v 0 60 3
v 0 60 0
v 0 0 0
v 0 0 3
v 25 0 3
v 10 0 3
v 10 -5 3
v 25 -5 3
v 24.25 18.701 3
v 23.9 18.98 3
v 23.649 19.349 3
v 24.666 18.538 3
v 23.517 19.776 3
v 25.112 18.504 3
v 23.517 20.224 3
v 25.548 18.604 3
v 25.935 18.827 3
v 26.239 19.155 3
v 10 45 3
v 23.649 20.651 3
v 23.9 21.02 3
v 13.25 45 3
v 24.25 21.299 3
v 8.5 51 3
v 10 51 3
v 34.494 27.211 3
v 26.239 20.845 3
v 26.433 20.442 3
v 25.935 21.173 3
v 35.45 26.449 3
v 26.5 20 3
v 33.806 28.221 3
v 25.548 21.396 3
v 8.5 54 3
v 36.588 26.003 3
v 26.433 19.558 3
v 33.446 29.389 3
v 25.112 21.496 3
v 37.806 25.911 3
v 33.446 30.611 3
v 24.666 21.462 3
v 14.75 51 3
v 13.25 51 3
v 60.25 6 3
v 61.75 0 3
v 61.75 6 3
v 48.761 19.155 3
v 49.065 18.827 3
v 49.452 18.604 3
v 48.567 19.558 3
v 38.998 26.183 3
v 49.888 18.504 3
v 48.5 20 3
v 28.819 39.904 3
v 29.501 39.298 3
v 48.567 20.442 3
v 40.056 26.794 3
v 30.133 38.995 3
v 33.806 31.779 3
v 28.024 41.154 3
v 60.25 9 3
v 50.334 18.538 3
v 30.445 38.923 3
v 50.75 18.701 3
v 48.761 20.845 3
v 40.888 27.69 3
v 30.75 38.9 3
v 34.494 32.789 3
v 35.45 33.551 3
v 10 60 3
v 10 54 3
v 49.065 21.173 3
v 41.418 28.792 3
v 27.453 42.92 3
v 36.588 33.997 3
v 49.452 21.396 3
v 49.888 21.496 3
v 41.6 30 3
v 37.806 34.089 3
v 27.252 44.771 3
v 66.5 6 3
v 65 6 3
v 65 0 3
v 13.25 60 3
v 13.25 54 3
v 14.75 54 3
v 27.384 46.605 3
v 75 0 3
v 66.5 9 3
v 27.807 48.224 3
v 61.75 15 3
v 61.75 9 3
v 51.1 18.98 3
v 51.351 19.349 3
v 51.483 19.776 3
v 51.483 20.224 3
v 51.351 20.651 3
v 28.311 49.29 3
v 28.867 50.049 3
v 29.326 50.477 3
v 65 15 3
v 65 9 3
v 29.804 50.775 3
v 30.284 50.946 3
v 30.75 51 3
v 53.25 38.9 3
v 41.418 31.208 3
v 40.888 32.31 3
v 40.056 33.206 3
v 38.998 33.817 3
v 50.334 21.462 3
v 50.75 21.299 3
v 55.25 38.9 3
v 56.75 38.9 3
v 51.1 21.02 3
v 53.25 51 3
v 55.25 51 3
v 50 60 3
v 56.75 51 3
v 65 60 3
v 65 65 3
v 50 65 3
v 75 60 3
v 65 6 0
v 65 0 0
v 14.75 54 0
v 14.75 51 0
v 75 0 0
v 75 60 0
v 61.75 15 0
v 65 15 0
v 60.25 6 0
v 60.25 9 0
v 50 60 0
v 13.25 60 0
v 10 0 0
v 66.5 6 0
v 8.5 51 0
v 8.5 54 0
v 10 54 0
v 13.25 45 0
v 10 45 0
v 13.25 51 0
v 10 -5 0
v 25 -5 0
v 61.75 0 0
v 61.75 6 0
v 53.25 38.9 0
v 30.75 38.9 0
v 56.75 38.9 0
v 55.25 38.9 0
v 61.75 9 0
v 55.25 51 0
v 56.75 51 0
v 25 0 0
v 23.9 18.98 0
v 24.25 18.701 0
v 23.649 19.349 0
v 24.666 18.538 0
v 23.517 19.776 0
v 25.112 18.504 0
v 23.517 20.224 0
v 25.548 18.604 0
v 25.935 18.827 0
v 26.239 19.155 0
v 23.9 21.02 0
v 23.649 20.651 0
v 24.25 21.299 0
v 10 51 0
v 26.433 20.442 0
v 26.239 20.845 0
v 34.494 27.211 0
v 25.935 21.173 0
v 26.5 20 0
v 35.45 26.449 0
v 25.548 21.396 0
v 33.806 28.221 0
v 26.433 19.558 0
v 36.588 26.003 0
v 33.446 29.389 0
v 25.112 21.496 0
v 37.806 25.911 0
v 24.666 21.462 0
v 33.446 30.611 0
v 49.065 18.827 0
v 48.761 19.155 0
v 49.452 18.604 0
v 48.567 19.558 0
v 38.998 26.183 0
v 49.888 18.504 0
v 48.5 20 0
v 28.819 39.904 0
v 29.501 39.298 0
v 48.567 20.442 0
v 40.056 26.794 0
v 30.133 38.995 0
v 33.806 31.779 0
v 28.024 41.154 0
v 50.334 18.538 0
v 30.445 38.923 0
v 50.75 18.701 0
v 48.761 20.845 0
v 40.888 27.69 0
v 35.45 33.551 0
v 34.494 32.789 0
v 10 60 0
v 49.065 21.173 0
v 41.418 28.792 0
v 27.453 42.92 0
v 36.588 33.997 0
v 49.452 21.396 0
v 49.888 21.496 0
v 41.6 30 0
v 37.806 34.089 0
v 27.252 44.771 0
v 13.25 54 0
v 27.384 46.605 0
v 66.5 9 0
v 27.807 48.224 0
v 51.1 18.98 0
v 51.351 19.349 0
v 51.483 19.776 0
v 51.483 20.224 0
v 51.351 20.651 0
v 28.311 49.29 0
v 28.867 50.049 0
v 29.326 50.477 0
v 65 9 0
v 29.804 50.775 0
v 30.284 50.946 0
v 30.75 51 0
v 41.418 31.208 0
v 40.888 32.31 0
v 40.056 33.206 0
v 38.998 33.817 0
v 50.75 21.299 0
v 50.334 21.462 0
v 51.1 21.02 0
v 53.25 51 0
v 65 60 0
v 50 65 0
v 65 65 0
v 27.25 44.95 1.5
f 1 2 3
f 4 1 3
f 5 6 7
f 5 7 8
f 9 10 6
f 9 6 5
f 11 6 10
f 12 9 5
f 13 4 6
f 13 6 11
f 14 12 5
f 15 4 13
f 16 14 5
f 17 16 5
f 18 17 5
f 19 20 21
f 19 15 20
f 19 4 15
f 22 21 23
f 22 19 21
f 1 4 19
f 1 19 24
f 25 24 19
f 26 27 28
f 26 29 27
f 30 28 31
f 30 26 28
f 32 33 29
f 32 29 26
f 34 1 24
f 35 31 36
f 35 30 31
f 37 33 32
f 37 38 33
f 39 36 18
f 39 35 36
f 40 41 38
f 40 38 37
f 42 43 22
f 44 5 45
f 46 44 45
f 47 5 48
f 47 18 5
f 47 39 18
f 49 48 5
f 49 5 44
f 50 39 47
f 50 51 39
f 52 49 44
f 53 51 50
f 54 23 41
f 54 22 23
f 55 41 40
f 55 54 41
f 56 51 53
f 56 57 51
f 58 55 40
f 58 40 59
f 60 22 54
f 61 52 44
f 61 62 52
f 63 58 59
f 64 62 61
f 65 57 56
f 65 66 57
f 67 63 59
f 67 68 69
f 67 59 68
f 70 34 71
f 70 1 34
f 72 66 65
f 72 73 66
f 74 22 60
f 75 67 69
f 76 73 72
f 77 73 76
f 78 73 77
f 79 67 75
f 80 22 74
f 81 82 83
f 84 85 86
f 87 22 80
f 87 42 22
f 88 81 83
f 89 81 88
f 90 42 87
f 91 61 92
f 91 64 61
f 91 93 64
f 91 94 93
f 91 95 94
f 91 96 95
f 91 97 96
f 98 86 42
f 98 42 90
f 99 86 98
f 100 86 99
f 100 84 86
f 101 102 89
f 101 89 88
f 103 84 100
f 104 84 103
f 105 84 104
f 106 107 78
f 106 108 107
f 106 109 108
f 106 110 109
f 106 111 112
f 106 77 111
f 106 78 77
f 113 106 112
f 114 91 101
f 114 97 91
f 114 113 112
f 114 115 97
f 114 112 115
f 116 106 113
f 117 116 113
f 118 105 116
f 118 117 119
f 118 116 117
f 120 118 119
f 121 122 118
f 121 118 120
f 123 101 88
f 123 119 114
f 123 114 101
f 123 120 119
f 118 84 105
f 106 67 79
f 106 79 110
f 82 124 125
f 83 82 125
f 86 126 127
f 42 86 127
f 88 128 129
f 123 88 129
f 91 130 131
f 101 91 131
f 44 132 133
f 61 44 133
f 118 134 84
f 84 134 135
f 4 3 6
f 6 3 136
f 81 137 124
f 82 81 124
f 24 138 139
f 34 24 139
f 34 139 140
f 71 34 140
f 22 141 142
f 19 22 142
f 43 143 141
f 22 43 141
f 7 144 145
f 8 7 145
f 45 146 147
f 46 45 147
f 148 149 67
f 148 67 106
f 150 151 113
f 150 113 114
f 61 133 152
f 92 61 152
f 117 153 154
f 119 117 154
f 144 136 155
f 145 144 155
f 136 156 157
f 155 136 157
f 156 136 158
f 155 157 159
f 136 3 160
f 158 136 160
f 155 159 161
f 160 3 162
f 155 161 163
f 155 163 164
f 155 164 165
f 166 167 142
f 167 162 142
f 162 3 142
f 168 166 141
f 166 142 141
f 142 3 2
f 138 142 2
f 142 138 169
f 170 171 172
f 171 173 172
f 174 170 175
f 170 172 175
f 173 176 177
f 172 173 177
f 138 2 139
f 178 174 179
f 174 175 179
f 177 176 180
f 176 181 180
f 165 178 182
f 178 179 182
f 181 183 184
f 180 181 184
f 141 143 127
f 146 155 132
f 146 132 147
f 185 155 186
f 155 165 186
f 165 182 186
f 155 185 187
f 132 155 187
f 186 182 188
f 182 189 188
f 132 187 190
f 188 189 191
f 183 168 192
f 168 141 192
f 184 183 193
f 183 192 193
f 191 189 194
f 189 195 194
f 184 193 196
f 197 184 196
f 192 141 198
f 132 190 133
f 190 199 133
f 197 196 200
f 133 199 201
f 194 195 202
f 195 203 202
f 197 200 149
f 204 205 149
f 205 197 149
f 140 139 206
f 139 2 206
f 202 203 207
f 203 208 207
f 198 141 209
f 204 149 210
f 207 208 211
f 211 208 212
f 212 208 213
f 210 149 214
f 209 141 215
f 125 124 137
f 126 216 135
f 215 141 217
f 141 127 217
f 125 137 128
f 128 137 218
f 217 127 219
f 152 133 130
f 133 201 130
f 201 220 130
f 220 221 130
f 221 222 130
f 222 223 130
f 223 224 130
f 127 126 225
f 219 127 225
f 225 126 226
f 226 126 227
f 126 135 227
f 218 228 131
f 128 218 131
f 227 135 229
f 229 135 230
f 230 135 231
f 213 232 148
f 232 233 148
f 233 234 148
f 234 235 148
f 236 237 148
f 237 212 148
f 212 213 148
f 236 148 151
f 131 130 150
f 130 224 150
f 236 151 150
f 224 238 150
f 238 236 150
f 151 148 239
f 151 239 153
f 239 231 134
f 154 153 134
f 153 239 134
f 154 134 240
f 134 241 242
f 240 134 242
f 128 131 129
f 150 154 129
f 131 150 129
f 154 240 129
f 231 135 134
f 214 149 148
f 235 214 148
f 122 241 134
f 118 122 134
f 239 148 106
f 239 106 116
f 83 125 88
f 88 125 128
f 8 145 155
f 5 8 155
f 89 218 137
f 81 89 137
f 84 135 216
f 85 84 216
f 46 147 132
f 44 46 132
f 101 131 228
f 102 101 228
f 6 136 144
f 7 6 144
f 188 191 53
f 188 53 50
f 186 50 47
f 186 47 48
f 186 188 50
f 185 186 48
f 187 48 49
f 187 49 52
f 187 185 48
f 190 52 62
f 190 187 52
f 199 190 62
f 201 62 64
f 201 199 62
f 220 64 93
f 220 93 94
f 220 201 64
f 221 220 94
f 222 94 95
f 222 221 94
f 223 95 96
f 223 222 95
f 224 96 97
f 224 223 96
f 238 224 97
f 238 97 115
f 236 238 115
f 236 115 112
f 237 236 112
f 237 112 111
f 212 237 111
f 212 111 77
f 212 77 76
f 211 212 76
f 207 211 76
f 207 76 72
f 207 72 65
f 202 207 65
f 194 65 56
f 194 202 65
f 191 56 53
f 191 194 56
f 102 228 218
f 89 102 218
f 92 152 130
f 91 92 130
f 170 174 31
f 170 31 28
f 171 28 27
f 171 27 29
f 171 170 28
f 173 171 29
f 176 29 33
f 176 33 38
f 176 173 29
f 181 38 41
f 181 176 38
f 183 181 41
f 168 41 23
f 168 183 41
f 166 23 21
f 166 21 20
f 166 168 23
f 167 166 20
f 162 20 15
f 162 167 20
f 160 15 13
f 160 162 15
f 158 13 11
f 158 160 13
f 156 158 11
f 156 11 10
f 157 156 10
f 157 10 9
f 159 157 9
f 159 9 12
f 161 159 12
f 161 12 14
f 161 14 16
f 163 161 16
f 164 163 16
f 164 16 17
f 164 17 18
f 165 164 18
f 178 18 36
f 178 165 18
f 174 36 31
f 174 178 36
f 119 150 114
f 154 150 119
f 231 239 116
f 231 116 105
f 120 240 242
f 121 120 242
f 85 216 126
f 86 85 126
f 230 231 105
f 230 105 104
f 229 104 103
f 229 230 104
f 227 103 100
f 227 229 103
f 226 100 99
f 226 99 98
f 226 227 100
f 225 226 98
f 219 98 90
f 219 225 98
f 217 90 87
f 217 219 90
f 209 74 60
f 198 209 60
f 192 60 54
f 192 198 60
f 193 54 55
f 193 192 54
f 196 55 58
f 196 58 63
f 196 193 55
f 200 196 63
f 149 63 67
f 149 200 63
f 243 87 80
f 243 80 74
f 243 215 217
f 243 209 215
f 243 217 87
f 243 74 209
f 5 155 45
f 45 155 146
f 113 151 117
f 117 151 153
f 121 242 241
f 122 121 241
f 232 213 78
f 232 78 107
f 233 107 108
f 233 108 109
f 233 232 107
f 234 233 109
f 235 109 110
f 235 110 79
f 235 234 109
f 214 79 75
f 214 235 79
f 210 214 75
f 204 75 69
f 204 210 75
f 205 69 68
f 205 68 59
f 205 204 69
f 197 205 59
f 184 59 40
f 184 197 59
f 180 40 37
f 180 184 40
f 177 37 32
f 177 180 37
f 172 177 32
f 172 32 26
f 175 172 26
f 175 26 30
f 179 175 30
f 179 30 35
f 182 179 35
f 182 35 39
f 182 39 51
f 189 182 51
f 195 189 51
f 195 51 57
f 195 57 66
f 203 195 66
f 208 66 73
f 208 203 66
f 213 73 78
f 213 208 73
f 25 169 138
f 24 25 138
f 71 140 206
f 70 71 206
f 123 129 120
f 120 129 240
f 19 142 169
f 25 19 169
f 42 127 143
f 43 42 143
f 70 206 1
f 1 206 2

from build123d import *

# Parameters (mm, degrees)
ESQUISSE1_R        = 4.1
ESQUISSE1_R_2      = 1.5
ESQUISSE1_W        = 1.5
ESQUISSE1_H        = 12.1
BOSS_EXTRU_1_DEPTH = 3


with BuildPart() as part:
    # Esquisse1 → Boss.-Extru.1 (new body)
    with BuildSketch(Plane.XY):
        Polygon((0, 0), (10, 0), (10, -5), (25, -5), (25, 0), (61.75, 0), (61.75, 6), (60.25, 6), (60.25, 9), (61.75, 9), (61.75, 15), (65, 15), (65, 9), (66.5, 9), (66.5, 6), (65, 6), (65, 0), (75, 0), (75, 60), (65, 60), (65, 65), (50, 65), (50, 60), (13.25, 60), (13.25, 54), (14.75, 54), (14.75, 51), (13.25, 51), (13.25, 45), (10, 45), (10, 51), (8.5, 51), (8.5, 54), (10, 54), (10, 60), (0, 60), align=None)
        with Locations((37.5, 30)):
            Circle(ESQUISSE1_R, mode=Mode.SUBTRACT)
        with Locations((25, 20)):
            Circle(ESQUISSE1_R_2, mode=Mode.SUBTRACT)
        with Locations(Location((50, 20, 0), (0, 0, 180))):
            Circle(ESQUISSE1_R_2, mode=Mode.SUBTRACT)
        with BuildLine():
            Line((30.75, 38.9), (53.25, 38.9))
            Line((53.25, 38.9), (53.25, 51))
            Line((53.25, 51), (30.75, 51))
            add(Edge.make_bspline(
                [(30.75, 51), (27.25, 51), (27.25, 44.95), (27.25, 38.9), (30.75, 38.9)],
                knots=[3.141592654, 3.141592654, 3.141592654, 4.71238898, 4.71238898, 6.283185307, 6.283185307, 6.283185307], degree=2, weights=[1, 0.707106781, 1, 0.707106781, 1]))
        make_face(mode=Mode.SUBTRACT)
        with Locations((56, 44.95)):
            Rectangle(ESQUISSE1_W, ESQUISSE1_H, mode=Mode.SUBTRACT)
    extrude(amount=BOSS_EXTRU_1_DEPTH)


solid = part.part
